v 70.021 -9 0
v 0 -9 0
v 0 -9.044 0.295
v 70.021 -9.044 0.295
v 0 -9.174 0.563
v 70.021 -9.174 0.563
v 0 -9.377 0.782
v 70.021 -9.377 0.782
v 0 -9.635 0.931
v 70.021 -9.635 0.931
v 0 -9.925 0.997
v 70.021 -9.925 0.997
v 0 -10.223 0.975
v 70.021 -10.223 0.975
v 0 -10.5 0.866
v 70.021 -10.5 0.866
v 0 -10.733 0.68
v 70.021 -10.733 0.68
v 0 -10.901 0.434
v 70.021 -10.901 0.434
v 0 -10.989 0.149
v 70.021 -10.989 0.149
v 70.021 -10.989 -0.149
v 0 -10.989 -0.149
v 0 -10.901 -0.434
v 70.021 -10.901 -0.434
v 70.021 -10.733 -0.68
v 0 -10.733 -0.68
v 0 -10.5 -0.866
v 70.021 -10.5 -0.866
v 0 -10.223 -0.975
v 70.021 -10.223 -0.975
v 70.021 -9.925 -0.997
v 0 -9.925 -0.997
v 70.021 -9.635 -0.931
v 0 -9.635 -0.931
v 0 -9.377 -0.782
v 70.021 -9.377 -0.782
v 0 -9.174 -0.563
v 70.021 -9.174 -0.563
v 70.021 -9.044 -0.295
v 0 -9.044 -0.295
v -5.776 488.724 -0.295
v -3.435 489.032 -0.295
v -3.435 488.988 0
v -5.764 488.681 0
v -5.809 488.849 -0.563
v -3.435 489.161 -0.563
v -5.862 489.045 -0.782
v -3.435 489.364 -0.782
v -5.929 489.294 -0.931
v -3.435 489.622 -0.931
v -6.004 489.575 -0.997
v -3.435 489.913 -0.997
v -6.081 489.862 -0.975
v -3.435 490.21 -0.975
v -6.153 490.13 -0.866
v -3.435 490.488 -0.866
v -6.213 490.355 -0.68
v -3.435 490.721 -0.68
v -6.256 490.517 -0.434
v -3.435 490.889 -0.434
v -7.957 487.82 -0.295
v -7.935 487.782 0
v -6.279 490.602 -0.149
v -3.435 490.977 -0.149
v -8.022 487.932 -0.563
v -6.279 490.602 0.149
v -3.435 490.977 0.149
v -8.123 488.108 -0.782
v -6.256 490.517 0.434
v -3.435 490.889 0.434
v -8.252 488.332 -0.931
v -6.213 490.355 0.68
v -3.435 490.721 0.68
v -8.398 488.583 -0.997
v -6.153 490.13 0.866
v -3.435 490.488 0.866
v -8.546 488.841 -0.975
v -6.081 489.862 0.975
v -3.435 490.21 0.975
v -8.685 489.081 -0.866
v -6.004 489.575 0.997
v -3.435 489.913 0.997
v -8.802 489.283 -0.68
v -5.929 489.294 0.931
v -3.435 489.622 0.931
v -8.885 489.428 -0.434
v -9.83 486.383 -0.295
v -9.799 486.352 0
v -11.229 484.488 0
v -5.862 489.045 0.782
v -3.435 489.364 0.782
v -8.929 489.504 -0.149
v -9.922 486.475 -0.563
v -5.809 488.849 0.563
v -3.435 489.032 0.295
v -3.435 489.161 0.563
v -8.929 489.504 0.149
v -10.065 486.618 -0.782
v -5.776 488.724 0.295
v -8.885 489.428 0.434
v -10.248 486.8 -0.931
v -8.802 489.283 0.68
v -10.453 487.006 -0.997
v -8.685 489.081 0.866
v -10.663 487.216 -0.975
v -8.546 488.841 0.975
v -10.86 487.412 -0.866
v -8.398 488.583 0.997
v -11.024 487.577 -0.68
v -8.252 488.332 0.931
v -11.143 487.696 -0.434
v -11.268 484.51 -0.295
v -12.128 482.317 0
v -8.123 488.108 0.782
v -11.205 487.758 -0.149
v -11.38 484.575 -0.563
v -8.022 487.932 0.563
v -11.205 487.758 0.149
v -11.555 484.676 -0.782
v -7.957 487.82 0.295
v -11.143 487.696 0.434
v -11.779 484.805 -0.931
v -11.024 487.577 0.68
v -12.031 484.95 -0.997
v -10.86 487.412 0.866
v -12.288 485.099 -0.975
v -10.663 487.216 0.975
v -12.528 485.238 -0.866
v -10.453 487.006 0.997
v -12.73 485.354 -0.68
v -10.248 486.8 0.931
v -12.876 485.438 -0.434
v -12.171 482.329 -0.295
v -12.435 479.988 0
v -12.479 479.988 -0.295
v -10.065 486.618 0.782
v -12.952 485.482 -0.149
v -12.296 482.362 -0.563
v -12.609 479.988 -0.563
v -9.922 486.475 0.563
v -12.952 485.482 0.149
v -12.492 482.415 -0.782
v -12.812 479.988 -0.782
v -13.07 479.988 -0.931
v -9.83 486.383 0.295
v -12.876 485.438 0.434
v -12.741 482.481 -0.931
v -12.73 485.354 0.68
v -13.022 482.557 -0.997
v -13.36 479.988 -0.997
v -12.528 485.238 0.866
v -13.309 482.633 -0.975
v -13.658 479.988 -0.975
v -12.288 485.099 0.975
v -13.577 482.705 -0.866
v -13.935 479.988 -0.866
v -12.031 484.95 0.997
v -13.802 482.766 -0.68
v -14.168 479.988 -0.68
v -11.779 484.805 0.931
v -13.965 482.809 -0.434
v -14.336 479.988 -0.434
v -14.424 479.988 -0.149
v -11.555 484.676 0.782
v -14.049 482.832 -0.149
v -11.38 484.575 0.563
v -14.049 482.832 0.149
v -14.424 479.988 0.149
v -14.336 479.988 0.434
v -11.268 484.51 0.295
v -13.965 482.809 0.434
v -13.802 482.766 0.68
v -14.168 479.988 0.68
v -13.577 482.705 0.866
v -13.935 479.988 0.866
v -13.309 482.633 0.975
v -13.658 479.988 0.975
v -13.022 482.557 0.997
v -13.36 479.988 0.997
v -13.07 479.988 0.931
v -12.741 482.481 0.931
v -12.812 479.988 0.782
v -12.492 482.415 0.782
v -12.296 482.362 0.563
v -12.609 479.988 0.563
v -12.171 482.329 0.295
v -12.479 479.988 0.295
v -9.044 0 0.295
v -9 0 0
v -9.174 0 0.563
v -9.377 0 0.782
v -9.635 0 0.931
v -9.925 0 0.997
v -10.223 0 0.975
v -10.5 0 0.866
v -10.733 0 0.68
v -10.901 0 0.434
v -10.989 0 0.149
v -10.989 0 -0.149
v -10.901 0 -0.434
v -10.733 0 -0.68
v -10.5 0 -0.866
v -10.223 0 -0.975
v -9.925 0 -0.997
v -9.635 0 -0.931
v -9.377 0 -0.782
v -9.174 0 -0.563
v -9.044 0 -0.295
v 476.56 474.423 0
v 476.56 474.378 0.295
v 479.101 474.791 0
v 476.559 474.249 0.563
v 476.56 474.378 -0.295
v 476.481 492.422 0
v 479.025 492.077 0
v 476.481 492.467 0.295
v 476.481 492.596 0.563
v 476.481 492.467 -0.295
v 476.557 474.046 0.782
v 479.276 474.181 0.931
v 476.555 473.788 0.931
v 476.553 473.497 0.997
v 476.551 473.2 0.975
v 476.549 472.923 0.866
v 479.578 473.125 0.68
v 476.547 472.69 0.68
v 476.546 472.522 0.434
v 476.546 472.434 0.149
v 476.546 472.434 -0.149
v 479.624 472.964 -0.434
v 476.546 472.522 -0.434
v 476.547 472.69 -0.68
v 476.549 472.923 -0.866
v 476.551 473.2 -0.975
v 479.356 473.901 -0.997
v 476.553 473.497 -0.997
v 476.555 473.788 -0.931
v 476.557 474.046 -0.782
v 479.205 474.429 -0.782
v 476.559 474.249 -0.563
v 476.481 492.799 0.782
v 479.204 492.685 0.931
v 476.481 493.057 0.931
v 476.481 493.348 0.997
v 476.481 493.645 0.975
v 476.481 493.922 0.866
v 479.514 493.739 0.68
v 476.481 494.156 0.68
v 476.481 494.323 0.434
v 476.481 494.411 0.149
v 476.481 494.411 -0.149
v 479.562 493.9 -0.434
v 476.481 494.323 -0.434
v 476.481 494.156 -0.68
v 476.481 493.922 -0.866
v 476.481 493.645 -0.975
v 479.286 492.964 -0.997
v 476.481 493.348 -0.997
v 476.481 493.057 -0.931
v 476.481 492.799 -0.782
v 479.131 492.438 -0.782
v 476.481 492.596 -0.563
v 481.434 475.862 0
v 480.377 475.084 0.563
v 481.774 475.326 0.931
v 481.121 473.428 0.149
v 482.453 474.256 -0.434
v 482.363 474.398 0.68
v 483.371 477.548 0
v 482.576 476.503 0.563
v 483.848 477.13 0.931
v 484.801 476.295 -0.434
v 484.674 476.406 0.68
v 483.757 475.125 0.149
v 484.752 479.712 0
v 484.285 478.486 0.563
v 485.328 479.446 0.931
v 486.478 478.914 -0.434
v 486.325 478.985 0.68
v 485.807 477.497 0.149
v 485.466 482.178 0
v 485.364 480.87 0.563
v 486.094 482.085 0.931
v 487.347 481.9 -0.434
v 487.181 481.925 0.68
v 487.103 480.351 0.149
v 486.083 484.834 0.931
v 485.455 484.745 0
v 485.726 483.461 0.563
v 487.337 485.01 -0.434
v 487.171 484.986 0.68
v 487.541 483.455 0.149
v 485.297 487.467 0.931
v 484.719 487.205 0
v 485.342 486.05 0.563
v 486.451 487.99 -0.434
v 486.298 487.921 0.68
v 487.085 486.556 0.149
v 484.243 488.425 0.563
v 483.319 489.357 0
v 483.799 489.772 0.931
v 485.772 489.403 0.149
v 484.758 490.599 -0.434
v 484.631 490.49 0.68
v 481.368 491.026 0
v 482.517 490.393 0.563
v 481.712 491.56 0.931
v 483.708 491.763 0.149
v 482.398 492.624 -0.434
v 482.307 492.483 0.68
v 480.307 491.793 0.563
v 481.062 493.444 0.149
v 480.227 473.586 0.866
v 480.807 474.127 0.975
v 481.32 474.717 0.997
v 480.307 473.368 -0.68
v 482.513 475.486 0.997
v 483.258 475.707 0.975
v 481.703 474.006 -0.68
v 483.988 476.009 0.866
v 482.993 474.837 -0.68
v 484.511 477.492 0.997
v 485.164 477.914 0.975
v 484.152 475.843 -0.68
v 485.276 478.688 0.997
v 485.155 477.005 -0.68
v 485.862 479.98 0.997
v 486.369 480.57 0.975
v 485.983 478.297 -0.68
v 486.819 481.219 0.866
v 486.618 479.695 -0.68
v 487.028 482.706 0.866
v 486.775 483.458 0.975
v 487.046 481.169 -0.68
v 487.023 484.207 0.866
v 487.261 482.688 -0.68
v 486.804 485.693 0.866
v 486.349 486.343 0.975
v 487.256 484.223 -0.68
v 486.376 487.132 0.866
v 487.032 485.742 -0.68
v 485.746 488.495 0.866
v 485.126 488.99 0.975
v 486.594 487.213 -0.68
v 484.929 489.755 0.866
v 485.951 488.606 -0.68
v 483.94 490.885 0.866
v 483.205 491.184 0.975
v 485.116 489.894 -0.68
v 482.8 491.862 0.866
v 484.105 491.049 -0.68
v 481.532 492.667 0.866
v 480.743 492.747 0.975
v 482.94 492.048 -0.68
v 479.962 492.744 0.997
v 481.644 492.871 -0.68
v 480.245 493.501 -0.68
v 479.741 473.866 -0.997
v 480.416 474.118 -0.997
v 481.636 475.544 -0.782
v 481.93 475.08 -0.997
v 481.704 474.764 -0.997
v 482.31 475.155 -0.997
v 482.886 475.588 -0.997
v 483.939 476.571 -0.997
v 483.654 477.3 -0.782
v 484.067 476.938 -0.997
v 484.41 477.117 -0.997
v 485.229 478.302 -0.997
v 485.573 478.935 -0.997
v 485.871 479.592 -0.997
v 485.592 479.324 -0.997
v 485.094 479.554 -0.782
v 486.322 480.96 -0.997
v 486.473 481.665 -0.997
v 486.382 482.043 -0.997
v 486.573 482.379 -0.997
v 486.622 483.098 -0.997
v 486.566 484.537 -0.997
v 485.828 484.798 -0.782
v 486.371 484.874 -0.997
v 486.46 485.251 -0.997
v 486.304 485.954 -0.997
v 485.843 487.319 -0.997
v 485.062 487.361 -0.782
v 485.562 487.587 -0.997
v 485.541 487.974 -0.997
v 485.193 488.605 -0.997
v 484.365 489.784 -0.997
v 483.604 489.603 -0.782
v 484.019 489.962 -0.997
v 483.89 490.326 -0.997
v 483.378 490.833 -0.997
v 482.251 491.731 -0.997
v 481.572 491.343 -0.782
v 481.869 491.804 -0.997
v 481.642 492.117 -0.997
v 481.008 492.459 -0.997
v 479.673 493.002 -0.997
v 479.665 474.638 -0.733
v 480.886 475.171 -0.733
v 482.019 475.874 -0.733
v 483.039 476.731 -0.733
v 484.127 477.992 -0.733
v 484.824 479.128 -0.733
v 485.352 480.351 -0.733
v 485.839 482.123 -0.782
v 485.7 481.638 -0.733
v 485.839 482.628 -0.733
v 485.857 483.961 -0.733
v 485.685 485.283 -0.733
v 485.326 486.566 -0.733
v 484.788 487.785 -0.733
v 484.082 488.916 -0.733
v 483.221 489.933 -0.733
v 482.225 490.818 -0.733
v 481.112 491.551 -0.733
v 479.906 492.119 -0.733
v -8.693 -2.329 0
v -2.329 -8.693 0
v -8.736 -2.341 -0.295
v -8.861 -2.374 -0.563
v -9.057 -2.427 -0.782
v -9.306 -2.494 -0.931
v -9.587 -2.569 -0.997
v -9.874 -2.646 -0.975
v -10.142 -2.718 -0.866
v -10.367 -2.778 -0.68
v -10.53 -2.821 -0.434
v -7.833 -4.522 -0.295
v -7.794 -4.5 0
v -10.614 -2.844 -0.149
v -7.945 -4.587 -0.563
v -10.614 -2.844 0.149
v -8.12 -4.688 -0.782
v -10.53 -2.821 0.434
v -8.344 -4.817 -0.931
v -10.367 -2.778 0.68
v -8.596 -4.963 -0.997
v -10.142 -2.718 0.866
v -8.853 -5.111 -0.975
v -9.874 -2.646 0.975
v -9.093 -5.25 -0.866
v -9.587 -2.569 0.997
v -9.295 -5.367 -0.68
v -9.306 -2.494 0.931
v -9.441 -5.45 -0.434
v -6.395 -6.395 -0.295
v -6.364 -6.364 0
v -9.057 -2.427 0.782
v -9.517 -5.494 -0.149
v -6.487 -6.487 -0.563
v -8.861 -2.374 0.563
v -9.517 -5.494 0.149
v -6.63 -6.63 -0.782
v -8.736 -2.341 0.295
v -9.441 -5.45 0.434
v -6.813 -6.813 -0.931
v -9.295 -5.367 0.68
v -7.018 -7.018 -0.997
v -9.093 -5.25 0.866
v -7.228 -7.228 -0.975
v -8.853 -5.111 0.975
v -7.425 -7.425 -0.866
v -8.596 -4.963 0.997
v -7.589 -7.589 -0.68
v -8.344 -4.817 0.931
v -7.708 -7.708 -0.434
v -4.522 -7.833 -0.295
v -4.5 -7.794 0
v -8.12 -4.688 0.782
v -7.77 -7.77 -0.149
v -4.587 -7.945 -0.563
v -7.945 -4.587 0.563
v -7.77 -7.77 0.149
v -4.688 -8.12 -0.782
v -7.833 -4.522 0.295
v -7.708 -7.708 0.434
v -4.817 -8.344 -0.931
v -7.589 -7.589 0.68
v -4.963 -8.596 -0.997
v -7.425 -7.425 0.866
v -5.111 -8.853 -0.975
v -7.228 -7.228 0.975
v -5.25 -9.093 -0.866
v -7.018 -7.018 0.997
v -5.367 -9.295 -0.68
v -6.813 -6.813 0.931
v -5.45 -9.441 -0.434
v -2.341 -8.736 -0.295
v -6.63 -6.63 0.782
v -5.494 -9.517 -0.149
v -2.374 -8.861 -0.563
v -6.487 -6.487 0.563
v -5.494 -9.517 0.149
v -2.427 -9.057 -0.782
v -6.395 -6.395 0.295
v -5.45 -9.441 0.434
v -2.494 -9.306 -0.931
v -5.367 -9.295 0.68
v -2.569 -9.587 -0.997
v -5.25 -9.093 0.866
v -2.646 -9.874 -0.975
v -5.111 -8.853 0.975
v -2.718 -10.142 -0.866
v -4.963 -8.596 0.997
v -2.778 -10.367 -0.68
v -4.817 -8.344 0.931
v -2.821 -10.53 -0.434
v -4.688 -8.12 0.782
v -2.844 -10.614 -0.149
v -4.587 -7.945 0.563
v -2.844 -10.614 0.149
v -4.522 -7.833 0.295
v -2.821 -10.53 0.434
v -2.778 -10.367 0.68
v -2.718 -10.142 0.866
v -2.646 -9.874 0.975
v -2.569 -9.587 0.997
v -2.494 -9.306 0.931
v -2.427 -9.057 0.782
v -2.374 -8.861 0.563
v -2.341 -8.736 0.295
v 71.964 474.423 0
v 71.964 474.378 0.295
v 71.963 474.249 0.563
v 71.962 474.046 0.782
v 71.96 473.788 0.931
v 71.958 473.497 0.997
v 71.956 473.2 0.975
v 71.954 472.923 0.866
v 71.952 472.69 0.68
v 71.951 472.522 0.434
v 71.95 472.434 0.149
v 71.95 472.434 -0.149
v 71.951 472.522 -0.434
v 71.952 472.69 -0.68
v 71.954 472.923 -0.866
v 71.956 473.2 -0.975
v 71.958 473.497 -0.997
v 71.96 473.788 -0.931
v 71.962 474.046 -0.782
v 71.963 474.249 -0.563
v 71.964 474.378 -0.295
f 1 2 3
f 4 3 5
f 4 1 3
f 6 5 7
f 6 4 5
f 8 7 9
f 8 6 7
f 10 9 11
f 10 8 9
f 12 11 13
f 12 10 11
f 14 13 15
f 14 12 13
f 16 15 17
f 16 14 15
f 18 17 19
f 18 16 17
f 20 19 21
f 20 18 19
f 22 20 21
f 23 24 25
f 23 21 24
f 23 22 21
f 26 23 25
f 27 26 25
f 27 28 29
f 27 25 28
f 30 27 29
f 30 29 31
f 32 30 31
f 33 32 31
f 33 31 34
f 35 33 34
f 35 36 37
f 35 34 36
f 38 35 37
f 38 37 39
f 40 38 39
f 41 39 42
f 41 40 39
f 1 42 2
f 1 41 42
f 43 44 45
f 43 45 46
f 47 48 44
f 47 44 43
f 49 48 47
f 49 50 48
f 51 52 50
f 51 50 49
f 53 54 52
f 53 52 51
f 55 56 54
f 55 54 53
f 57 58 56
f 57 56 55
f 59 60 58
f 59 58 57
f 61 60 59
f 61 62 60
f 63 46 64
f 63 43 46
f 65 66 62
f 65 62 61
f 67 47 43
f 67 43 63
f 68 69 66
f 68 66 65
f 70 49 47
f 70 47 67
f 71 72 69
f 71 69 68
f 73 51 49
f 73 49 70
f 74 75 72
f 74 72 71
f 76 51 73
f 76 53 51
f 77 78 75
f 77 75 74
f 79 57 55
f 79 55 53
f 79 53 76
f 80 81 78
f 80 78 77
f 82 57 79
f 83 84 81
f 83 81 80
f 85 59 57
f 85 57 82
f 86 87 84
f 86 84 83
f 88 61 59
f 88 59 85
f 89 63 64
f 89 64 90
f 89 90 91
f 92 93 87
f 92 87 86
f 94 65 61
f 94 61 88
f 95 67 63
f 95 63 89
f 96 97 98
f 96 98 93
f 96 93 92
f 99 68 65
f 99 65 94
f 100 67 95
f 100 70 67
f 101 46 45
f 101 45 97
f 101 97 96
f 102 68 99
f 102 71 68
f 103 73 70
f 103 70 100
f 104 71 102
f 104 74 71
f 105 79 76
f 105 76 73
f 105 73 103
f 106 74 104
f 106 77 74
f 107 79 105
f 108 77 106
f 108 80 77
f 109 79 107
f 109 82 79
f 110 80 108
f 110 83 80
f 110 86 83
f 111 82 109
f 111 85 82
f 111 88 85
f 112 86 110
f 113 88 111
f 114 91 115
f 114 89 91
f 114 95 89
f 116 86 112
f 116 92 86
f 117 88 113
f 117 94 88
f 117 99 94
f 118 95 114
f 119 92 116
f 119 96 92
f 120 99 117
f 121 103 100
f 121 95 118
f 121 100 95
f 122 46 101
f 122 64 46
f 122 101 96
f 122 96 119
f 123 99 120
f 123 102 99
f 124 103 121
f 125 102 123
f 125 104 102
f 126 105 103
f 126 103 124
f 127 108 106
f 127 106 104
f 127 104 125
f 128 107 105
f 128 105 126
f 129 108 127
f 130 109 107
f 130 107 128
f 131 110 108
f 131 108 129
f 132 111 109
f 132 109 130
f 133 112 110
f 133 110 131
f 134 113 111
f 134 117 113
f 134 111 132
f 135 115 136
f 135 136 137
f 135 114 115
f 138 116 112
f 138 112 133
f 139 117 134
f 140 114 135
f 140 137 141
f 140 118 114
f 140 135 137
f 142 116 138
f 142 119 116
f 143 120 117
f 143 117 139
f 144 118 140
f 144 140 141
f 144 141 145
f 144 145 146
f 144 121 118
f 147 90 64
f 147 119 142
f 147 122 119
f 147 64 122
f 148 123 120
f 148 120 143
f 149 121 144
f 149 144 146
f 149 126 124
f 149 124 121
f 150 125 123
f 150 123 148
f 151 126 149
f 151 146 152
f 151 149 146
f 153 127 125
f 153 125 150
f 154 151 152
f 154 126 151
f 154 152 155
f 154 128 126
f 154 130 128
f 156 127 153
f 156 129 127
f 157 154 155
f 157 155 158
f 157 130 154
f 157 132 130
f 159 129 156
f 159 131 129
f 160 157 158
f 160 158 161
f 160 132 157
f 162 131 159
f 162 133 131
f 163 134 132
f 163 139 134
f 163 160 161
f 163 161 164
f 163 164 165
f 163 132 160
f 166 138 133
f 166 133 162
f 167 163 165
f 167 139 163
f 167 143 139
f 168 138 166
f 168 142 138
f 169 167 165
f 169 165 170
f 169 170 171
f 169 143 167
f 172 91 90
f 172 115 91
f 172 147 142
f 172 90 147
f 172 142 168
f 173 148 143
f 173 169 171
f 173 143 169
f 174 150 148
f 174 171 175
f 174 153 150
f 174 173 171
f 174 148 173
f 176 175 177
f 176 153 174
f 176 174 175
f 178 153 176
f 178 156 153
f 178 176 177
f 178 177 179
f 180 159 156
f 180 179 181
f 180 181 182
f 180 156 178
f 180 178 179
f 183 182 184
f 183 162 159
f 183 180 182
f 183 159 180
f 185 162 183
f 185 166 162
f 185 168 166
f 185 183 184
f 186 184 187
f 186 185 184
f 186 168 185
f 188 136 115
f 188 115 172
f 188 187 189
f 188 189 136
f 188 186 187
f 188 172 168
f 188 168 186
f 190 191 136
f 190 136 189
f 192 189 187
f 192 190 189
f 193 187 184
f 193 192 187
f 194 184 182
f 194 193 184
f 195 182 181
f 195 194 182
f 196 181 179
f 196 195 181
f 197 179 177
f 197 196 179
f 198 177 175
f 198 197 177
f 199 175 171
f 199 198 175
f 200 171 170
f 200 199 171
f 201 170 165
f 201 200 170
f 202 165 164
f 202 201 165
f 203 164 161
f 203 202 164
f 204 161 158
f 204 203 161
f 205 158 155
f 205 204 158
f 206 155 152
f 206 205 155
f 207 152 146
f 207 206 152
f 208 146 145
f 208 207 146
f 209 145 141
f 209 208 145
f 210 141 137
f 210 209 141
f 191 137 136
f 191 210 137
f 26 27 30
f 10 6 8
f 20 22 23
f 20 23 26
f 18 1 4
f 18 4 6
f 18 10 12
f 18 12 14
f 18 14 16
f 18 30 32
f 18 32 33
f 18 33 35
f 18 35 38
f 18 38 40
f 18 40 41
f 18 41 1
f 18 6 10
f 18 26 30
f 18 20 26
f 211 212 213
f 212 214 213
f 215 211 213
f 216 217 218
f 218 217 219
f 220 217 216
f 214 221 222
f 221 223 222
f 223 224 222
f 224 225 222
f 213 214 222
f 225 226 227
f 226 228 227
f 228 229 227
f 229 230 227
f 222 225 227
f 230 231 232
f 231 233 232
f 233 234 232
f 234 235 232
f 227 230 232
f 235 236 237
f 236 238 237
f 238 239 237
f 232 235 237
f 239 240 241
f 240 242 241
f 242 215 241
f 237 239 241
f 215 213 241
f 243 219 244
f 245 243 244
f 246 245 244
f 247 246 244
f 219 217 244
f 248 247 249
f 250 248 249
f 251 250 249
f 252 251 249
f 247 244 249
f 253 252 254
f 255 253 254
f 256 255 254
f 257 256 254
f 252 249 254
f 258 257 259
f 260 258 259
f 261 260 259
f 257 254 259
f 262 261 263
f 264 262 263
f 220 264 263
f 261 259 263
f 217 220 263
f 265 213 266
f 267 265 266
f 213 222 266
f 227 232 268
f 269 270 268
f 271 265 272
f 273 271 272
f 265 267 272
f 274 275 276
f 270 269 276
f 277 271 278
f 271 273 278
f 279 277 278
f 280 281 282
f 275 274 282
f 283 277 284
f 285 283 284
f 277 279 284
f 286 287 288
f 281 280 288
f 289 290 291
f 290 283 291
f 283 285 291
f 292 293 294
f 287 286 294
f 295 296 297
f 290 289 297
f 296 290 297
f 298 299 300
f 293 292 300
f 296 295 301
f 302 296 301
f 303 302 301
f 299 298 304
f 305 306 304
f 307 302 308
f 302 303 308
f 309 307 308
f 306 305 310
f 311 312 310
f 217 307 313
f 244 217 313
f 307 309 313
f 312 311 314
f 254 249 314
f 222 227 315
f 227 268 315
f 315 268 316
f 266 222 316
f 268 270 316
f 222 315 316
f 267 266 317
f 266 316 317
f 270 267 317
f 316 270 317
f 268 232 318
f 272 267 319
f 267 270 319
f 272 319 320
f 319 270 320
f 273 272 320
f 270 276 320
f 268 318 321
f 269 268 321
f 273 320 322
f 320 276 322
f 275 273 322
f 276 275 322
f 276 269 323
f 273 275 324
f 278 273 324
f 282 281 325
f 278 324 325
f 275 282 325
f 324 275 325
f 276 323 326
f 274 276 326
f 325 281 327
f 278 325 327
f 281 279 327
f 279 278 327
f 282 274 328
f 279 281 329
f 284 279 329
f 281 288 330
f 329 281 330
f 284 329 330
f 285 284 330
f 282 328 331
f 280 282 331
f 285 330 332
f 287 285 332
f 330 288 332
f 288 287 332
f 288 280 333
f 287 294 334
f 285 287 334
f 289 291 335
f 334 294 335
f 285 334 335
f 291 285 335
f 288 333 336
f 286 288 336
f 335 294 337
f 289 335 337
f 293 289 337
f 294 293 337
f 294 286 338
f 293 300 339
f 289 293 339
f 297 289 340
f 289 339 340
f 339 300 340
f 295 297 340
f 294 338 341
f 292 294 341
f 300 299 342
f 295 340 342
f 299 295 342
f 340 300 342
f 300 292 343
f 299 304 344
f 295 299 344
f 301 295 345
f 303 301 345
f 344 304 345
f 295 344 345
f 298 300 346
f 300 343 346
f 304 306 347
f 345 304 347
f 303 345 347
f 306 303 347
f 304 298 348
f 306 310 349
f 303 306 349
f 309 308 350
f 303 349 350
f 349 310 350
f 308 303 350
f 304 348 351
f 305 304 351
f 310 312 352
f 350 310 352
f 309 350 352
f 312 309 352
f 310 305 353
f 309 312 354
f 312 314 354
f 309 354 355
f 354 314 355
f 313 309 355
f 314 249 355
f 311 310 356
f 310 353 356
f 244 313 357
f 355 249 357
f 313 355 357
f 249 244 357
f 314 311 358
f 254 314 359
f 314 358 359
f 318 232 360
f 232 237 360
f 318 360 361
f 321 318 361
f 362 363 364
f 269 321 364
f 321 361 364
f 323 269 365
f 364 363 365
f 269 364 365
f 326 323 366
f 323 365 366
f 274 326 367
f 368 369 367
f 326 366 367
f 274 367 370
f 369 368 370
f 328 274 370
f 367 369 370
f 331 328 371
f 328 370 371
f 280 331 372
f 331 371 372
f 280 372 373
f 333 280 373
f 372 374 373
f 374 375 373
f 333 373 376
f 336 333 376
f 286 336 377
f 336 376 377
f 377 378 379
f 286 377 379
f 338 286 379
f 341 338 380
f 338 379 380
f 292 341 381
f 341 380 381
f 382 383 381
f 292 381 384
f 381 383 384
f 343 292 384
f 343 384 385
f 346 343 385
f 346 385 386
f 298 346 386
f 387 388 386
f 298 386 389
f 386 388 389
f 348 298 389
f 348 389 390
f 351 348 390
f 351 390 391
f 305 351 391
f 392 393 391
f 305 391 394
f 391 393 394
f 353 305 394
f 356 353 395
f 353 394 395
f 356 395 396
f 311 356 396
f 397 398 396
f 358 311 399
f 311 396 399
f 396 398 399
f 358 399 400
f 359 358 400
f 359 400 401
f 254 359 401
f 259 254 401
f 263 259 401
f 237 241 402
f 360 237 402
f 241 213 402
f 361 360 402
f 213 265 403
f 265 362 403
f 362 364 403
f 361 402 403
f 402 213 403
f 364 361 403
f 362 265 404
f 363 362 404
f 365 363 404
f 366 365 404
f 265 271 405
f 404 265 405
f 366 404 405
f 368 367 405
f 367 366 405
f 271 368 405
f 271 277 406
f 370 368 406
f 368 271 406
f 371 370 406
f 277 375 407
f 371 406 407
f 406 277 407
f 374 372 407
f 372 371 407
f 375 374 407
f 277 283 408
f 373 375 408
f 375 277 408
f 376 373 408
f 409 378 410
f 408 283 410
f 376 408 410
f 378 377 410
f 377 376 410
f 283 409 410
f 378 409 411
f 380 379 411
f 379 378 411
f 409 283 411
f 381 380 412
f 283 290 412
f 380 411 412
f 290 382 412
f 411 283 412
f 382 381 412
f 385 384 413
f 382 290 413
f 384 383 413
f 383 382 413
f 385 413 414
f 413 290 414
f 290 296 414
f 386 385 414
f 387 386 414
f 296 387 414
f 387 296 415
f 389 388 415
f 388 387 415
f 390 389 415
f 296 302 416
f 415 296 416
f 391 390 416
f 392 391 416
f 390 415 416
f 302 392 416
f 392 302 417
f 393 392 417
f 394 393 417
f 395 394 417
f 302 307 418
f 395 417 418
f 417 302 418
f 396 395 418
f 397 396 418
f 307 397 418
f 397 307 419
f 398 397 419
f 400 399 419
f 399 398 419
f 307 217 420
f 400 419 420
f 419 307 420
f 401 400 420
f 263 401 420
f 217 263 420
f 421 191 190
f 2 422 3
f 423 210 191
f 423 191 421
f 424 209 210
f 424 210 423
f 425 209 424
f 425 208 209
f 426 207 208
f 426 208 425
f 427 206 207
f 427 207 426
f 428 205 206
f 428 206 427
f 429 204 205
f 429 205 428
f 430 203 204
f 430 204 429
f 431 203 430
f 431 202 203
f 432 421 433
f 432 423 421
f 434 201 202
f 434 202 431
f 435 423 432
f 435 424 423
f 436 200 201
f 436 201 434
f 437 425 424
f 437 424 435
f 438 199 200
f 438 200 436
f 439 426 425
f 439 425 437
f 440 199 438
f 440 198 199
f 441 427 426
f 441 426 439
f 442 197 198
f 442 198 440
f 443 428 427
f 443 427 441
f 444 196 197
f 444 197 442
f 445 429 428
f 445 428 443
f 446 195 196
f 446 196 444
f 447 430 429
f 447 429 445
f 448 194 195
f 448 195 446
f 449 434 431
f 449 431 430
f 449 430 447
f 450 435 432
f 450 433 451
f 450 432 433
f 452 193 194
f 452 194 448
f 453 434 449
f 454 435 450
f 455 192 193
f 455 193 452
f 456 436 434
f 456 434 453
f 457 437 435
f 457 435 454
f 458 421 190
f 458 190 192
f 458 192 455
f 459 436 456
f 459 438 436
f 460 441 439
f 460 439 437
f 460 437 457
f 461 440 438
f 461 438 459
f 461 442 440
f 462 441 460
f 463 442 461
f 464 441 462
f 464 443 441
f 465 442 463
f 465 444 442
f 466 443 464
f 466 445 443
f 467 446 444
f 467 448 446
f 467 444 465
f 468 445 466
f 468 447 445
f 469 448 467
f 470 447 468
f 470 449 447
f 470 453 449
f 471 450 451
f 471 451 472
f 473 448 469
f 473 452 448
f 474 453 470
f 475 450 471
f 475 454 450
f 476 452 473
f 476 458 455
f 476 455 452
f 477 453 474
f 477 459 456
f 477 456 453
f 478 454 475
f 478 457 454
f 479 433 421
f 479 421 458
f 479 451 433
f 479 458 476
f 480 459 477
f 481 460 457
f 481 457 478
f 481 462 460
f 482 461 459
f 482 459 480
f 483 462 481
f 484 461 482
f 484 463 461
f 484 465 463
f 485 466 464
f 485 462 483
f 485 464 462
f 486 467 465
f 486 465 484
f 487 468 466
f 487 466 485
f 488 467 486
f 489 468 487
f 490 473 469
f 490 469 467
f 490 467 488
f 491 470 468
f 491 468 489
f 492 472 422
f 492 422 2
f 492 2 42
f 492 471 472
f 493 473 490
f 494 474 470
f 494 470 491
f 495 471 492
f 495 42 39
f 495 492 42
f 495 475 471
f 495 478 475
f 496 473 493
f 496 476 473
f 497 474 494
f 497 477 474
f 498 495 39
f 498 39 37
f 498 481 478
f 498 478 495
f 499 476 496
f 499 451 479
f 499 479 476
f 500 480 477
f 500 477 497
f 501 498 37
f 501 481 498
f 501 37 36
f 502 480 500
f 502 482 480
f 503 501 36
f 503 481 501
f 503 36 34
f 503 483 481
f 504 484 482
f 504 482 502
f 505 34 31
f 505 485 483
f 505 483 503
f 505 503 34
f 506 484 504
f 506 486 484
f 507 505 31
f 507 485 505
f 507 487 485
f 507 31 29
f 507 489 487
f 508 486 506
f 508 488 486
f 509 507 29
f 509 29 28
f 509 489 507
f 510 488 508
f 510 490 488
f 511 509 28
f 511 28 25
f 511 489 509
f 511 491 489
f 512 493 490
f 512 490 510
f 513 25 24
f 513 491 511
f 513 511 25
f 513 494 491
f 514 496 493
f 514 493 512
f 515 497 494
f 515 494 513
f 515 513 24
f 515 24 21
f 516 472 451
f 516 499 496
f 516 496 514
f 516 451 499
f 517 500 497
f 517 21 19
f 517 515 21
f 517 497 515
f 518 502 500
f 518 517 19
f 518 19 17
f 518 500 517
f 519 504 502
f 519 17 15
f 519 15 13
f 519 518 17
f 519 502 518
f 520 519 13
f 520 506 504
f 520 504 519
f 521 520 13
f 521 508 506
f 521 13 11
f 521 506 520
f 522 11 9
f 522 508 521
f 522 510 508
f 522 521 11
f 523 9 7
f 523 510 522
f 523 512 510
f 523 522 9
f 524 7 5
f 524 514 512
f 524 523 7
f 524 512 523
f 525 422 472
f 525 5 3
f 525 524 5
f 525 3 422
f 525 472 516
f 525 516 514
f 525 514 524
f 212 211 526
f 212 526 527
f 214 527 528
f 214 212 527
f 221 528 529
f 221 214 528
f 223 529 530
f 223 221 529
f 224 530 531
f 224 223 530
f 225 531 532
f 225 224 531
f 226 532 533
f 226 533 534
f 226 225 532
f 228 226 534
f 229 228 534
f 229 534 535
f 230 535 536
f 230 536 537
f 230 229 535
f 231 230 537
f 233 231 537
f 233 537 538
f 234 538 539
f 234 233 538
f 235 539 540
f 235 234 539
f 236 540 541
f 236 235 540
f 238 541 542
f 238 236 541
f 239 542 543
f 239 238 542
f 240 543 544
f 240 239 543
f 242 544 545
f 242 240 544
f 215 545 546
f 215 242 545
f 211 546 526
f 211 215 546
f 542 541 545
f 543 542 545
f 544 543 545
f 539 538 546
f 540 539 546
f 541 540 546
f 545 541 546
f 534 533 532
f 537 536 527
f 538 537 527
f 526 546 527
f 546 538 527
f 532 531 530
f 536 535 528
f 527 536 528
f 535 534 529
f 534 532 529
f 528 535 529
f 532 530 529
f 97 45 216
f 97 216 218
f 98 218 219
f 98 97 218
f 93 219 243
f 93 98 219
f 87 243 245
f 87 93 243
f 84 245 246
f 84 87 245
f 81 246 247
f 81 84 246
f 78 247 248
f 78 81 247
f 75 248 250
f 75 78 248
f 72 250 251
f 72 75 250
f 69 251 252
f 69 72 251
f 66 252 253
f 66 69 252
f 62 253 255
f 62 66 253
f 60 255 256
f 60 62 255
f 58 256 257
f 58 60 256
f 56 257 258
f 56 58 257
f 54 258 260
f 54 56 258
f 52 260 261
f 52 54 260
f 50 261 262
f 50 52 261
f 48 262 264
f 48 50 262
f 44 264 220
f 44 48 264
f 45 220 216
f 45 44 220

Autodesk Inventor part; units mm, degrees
ref_plane "YZ Plane" through (0, 0, 0) normal (1, 0, 0) x (0, 1, 0)
ref_plane "XZ Plane" through (0, 0, 0) normal (0, 1, 0) x (-1, 0, 0)
ref_plane "XY Plane" through (0, 0, 0) normal (0, 0, 1) x (1, 0, 0)
ref_plane "Arbeitsebene1" through (0, 0, 0) normal (0, 0, 1) x (1, 0, 0)
sketch "Skizze1" plane through (0, 0, 0) normal (0, 0, 1) x (1, 0, 0)
  circle A0 centre (0, 0) radius 10 projected
  arc A1 (-10, 0) -> (0, -10) centre (0, 0) ccw
  line L0 (0, -10) -> (70.0214, -10)
  circle A2 centre (-3.435, 479.9877) radius 10 projected
  arc A3 (-3.435, 489.9877) -> (-13.435, 479.9877) centre (-3.435, 479.9877) ccw
  line L1 (-13.435, 479.9877) -> (-10, 0)
  circle A4 centre (476.5527, 483.4227) radius 10 projected
  line L2 (-3.435, 489.9877) -> (476.4811, 493.4225)
  arc A5 (476.5527, 473.4227) -> (476.4811, 493.4225) centre (476.5527, 483.4227) ccw
  line L3 (476.5527, 473.4227) -> (71.9572, 473.4227)
  point P0 (0, 0)
ref_plane "Arbeitsebene2" through (70.0214, -10, 0) normal (1, 0, 0) x (0, 1, 0)
sketch "Skizze2" plane through (70.0214, -10, 0) normal (1, 0, 0) x (0, 1, 0)
  circle A0 centre (0, 0) radius 1
  point P0 (10, 0)
  dimension "d0" = 2
sweep "Sweeping1" add profiles "Skizze2" path "Skizze1" path curves L0 A1 L1 A3 L2 A5 L3
properties part number "Seil2"
